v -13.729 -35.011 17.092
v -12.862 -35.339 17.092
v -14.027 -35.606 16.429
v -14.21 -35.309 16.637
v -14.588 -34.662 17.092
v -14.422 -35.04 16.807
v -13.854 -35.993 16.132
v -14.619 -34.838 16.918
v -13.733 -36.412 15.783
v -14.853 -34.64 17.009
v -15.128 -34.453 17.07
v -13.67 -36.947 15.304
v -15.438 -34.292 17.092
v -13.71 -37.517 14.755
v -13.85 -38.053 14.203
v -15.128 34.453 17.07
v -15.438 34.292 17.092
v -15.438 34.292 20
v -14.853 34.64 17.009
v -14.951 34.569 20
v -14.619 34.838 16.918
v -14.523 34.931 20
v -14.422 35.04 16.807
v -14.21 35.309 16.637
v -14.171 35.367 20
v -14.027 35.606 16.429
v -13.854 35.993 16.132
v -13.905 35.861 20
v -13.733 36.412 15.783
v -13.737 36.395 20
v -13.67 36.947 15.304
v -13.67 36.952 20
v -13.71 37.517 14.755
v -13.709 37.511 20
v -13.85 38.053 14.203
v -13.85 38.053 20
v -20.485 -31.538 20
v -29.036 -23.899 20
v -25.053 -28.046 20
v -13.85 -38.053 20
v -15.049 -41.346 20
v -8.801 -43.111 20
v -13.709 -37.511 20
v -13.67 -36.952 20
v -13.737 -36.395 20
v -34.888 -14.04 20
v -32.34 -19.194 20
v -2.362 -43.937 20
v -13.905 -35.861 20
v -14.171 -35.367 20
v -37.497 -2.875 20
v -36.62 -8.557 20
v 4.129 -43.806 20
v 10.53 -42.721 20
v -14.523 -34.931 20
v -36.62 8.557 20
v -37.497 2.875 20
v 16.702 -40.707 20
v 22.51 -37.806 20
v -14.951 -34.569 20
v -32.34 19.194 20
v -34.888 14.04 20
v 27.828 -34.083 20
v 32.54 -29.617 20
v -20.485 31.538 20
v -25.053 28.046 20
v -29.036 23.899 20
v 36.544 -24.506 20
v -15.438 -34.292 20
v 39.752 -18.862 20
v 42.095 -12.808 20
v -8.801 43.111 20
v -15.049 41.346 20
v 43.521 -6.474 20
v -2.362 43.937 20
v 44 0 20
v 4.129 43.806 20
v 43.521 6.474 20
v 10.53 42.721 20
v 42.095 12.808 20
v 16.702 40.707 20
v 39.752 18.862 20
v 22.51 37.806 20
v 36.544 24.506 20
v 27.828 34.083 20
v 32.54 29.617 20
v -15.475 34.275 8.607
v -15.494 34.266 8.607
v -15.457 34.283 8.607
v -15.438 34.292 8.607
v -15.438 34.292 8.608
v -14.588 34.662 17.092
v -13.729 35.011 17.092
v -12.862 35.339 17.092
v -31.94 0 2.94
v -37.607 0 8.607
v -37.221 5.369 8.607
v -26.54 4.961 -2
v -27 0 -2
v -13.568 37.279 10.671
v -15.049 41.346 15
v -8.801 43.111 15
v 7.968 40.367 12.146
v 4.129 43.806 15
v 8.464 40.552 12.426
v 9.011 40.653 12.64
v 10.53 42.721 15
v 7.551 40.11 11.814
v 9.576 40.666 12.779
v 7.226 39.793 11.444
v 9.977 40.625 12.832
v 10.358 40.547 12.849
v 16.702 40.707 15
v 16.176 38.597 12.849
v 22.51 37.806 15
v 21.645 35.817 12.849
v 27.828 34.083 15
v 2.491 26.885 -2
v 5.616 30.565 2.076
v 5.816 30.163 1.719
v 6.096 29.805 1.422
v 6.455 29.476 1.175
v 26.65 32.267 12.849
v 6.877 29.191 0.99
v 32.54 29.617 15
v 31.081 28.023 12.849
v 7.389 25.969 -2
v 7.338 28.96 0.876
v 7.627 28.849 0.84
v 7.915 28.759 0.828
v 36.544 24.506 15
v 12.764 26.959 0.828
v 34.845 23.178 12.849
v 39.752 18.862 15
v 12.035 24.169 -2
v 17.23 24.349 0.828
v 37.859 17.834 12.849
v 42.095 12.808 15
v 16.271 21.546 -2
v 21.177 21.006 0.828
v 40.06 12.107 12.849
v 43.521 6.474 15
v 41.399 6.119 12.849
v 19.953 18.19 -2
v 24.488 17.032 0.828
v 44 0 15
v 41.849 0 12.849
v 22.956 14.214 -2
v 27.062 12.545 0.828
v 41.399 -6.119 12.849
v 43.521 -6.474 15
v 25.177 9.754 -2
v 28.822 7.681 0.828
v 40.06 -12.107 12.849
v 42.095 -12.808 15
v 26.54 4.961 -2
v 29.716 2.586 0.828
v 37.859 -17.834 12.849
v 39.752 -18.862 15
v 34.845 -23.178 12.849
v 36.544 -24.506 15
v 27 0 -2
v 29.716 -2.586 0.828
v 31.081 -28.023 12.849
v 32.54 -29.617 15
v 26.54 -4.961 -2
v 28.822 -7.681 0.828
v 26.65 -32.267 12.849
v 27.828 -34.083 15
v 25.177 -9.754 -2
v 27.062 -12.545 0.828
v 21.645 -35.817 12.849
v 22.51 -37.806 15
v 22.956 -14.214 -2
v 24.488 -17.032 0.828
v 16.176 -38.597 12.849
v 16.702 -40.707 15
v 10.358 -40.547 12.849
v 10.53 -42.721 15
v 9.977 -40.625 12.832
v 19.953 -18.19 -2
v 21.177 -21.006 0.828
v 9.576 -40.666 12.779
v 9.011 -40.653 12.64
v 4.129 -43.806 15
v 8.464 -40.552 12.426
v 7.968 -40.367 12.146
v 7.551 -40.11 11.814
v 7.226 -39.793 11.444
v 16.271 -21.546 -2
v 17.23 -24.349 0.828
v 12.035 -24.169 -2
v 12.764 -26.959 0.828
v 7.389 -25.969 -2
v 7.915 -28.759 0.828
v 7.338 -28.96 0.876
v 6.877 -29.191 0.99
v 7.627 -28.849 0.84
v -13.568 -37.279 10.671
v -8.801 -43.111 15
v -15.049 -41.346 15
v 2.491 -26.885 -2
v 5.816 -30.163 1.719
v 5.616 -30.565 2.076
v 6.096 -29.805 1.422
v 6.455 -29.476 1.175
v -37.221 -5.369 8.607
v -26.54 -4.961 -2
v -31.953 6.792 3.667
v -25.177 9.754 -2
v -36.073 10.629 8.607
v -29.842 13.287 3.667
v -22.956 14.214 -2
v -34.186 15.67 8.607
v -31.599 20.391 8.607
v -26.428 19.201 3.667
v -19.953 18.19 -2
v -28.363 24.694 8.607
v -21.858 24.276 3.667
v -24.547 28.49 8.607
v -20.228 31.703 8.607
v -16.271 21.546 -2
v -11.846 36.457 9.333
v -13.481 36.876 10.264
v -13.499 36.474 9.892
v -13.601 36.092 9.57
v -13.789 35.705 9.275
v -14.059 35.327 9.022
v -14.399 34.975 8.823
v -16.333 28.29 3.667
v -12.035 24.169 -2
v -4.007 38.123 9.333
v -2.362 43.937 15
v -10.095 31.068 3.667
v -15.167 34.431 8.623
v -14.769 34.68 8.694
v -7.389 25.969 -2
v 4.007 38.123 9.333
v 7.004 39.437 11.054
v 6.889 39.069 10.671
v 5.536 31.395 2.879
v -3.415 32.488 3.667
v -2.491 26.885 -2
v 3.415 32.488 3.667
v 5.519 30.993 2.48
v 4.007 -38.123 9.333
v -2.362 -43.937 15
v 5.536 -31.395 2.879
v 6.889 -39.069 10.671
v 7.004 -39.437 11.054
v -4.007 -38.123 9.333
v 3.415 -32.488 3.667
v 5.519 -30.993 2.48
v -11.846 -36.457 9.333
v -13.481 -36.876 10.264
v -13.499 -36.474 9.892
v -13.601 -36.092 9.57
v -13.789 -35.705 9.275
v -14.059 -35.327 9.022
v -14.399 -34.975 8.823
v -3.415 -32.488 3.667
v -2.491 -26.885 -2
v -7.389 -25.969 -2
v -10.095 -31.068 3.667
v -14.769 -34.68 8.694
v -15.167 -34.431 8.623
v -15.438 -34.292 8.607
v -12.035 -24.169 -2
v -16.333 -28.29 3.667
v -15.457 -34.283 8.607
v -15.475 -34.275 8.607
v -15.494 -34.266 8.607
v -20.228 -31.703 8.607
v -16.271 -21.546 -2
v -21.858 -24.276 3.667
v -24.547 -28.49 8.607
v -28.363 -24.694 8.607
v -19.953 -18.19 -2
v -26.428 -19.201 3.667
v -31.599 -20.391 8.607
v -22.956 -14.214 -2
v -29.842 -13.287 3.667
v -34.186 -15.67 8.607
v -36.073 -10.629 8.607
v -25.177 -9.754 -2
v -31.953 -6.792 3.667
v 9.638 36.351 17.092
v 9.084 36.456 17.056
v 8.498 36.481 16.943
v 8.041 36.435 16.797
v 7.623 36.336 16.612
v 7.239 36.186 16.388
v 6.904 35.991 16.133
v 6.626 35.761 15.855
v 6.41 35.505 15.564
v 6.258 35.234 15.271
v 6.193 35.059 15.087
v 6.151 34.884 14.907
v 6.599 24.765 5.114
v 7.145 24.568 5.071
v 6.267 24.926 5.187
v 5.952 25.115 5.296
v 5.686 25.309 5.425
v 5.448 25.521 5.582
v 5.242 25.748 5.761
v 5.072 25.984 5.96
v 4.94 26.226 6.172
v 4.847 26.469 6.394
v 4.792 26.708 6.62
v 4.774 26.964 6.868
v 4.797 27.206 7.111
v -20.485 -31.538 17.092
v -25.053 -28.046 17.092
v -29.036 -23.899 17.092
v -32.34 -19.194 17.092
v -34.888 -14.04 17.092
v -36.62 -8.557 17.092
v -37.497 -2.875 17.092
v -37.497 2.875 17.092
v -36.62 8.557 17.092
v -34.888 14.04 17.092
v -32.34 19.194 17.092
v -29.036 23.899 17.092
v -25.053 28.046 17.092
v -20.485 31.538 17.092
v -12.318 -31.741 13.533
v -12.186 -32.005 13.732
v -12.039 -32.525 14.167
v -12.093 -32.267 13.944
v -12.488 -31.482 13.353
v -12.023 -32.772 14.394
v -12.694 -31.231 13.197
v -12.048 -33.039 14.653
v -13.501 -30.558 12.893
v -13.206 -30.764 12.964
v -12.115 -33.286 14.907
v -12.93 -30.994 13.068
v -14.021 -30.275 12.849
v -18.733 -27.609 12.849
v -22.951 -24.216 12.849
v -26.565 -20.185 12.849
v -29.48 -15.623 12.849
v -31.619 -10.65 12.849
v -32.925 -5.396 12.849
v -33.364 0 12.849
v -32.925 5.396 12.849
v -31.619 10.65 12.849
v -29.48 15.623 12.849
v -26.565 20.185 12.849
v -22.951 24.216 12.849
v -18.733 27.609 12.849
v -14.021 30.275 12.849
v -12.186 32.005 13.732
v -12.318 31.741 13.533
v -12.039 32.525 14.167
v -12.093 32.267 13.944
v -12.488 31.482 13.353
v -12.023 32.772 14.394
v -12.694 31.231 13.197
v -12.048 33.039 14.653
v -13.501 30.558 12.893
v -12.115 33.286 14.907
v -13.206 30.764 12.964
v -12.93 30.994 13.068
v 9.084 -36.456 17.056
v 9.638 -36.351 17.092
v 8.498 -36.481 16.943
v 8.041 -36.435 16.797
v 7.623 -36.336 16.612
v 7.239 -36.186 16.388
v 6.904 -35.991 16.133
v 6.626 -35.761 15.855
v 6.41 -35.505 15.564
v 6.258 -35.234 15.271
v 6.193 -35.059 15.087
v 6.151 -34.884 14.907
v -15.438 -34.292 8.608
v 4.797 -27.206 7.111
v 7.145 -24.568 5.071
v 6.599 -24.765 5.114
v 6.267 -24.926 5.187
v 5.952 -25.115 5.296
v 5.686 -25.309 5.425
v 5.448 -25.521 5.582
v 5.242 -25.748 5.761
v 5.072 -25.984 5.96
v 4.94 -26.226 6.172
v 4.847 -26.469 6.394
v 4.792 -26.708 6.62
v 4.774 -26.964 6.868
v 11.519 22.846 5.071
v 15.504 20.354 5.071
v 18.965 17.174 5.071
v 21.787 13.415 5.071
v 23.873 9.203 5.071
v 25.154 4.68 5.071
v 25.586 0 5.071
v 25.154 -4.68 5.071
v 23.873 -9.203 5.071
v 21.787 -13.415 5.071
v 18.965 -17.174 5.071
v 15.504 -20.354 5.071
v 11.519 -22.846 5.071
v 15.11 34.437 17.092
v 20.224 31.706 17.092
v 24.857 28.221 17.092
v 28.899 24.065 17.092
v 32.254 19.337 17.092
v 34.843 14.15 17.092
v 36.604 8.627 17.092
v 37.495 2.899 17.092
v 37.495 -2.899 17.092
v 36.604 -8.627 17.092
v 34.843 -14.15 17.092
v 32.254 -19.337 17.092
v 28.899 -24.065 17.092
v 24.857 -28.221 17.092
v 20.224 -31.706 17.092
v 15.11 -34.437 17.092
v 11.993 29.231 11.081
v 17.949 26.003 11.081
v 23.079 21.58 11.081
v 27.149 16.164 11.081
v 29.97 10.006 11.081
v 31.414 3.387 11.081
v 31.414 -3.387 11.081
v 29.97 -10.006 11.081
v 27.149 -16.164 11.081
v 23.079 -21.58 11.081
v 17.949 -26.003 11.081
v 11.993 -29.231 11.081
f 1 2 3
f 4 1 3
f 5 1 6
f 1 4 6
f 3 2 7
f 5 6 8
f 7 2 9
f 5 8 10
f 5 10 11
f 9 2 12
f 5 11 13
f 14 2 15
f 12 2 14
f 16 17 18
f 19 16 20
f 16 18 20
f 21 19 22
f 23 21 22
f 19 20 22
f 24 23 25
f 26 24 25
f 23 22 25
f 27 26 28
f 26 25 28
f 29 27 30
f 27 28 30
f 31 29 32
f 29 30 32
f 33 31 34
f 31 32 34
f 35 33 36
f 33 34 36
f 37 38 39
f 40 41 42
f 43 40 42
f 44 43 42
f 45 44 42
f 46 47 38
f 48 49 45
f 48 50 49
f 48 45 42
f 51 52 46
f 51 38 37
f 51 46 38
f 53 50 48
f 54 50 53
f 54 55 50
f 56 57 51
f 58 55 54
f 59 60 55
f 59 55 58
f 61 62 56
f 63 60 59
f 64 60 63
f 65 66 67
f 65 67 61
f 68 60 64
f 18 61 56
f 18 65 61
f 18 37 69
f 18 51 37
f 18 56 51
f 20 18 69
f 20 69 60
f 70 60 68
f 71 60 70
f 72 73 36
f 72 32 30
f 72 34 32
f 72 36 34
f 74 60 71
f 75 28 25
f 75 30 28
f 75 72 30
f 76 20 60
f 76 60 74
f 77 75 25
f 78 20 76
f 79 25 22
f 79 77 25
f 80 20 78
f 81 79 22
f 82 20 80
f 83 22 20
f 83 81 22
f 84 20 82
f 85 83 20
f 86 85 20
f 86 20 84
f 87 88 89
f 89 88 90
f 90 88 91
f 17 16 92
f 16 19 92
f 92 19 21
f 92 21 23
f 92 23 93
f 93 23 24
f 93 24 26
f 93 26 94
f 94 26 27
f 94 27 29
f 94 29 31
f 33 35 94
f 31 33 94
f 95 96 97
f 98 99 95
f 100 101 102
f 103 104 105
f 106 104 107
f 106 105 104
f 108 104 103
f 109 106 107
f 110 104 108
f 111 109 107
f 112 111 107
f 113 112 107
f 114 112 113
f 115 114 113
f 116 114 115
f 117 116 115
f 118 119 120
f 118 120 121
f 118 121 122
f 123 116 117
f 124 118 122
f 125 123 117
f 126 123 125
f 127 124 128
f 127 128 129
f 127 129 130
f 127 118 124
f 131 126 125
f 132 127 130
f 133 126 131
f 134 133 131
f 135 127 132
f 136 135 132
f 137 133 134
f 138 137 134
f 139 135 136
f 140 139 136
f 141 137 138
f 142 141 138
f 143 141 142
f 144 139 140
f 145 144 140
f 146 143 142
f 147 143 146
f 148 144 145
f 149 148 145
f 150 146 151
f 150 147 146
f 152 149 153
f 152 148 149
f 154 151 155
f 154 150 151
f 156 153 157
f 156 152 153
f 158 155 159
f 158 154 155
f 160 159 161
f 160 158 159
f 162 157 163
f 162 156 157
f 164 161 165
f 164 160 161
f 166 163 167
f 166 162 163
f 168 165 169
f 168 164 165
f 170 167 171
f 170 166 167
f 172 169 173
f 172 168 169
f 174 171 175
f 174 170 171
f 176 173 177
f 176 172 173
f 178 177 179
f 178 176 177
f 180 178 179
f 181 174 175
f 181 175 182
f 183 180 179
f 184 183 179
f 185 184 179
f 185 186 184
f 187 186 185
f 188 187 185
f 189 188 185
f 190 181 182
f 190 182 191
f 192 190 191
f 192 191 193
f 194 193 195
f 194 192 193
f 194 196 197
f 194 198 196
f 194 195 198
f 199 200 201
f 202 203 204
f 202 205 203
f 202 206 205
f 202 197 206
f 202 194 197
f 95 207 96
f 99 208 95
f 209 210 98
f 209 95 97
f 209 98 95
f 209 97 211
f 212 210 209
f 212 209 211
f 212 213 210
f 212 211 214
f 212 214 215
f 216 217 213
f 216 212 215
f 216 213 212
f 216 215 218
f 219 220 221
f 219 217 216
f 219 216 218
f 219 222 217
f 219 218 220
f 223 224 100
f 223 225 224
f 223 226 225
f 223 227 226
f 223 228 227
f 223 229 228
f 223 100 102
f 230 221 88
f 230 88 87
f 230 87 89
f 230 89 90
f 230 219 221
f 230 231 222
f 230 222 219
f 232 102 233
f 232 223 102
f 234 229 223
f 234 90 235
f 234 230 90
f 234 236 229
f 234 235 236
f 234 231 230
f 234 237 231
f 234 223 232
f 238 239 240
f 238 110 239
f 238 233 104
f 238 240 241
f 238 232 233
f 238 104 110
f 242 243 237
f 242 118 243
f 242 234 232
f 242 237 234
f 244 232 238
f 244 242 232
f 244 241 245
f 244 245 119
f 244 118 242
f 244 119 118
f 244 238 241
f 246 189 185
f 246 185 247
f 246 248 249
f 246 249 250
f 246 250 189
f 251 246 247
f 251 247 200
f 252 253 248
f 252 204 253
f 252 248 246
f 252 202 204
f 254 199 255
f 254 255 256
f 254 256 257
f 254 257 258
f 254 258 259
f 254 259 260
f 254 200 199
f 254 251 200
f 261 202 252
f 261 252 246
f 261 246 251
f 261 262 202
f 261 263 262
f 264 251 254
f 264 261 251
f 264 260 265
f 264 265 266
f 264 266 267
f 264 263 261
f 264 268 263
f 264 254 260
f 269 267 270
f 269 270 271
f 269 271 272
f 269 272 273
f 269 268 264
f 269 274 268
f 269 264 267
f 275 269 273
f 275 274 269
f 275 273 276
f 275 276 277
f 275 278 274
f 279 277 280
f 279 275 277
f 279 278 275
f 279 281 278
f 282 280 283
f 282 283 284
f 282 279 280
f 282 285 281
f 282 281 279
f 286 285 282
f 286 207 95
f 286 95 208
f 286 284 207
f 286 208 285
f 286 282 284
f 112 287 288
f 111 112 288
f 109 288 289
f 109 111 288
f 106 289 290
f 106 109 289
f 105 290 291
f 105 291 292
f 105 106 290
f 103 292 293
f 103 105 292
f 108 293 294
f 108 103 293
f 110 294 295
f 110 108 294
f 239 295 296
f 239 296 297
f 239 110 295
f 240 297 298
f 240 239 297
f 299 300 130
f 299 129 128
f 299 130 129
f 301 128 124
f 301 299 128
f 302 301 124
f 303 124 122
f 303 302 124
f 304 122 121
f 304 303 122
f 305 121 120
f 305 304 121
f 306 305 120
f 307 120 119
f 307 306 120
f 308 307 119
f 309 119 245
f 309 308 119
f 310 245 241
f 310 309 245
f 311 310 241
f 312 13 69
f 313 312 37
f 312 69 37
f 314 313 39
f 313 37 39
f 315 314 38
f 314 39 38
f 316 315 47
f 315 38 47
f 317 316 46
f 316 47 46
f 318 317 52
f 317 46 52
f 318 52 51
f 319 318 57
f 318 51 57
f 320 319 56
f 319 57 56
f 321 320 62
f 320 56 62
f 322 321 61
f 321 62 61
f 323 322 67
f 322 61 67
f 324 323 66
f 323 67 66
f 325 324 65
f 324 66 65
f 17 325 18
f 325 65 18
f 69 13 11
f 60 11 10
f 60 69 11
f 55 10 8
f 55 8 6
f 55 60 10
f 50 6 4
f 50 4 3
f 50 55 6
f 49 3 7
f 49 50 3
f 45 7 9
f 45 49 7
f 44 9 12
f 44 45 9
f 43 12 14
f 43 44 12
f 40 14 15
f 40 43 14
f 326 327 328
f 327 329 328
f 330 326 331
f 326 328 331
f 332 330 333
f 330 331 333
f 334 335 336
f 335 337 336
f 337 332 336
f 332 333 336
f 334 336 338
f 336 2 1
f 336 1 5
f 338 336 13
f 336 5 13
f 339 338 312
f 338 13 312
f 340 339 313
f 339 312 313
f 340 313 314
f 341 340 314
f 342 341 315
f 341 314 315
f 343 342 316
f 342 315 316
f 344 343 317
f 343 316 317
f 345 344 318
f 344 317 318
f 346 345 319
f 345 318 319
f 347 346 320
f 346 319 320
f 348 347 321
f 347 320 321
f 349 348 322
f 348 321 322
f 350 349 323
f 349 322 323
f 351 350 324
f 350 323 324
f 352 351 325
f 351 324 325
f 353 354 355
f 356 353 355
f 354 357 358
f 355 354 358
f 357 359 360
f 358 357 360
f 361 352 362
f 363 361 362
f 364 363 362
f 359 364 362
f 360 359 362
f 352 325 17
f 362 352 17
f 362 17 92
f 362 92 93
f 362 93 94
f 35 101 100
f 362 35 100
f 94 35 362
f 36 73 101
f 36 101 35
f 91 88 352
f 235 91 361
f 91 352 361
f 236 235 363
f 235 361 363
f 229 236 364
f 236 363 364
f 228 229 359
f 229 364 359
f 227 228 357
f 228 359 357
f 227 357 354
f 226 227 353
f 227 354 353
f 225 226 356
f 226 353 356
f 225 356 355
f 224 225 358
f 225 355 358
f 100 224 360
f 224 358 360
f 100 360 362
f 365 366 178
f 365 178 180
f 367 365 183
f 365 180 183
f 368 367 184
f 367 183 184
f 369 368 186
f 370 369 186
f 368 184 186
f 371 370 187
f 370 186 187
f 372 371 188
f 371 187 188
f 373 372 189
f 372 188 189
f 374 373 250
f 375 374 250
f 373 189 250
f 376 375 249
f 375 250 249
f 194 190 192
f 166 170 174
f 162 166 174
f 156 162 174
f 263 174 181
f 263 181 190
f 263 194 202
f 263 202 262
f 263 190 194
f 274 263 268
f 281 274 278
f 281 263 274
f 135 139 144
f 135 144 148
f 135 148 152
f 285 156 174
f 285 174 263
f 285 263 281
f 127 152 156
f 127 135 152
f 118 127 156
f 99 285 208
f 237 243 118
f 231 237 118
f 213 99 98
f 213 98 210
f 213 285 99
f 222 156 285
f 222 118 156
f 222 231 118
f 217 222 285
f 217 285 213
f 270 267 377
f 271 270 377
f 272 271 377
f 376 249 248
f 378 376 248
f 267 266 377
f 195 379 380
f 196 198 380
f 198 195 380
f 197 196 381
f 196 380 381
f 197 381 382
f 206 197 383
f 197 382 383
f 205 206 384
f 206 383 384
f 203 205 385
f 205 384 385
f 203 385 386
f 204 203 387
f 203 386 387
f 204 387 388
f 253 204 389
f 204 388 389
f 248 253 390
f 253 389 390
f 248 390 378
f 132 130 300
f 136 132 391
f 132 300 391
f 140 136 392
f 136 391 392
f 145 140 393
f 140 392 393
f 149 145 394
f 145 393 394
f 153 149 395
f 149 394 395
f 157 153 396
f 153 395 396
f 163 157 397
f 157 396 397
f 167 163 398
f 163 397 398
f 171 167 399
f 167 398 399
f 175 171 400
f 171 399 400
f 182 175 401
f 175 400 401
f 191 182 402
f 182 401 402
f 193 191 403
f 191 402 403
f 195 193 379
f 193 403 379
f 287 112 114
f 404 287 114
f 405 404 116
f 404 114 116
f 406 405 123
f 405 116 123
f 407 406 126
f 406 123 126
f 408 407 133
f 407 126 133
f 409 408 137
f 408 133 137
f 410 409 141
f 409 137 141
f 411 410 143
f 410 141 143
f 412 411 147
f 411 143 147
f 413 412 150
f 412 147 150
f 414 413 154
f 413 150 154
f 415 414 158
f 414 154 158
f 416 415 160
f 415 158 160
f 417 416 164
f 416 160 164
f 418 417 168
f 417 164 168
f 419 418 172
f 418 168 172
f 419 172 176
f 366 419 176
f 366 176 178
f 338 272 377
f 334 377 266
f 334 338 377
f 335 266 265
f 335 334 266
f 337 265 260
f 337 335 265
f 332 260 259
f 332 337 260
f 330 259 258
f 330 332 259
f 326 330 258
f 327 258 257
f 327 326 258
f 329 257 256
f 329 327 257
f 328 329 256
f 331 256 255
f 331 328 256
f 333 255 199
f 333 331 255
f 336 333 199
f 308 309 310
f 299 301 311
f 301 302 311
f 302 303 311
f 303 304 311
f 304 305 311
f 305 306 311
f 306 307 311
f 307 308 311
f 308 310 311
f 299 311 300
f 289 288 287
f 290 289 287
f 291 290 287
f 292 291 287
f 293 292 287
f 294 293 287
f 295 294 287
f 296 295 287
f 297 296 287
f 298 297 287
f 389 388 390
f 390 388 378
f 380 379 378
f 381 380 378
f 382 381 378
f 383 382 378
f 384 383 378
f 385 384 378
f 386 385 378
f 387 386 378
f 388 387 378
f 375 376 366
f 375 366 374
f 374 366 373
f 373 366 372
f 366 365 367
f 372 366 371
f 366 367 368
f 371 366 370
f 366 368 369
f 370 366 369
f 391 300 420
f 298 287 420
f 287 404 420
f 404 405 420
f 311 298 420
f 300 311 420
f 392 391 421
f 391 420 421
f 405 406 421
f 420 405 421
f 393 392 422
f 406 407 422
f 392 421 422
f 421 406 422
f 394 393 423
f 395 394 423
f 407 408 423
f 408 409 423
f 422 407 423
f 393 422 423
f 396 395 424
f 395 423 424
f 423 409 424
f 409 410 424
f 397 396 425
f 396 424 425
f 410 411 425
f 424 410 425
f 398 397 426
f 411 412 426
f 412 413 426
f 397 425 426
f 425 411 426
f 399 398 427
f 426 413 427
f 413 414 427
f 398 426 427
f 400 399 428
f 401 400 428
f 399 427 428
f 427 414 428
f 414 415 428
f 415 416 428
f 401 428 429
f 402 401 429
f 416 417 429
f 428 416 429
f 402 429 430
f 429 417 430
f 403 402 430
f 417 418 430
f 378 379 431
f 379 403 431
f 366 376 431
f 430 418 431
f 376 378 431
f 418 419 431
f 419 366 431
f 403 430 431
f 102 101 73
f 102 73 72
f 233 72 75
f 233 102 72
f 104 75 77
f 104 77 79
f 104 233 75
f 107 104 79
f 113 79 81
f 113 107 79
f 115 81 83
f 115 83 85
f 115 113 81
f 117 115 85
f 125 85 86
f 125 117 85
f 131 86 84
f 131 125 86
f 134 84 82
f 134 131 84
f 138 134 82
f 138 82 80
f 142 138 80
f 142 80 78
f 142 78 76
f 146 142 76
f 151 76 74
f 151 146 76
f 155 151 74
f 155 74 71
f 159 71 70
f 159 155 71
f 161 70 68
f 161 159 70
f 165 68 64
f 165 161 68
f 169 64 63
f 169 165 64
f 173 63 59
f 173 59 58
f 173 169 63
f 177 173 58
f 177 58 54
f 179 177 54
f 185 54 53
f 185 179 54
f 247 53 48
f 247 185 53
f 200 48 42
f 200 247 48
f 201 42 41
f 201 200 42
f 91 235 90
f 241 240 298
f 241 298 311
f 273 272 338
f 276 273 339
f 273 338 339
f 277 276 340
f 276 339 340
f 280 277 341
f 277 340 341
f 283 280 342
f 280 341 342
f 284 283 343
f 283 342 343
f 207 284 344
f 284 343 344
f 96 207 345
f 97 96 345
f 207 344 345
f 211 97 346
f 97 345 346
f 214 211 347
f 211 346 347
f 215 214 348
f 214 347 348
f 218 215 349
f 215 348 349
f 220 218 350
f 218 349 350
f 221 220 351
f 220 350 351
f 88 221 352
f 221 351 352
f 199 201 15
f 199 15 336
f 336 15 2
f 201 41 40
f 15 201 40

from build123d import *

# Parameters (mm, degrees)
F3_W           = 8.3933982822
F3_H           = 16.3933982822
F4_ANGLE_BACK  = 70
F4_ANGLE       = 140
F6_ANGLE_START = 100
F6_ANGLE       = 160
F7_ANGLE_BACK  = 70
F7_ANGLE       = 140
F8_R           = 3
F8_2_R         = 3
F9_R           = 3


with BuildPart() as f1:
    # F0 (on Front) → F1 (revolve)
    with BuildSketch(Plane.XZ):
        Polygon((-44, 15), (-27, -2), (0, -2), (0, 20), (-44, 20), align=None)
    revolve(axis=Axis((0, 0, 9.4880101401), (0, 0, -1)))


with BuildPart() as f4:
    # F3 (on Front) → F4 (revolve)
    with BuildSketch(Plane.XZ, mode=Mode.PRIVATE) as f4_sk:
        with Locations((-41.8033008589, 16.8033008589)):
            Rectangle(F3_W, F3_H)
    revolve(f4_sk.sketch.rotate(Axis((0, 0, 9.4880101401), (0, 0, -1)), -F4_ANGLE_BACK), axis=Axis((0, 0, 9.4880101401), (0, 0, -1)), revolution_arc=F4_ANGLE)

    # F8#2
    f8_2_edges = [f4.edges().sort_by_distance(p)[0] for p in [
        (-12.862215, 35.338646, 16.803301),
        (-12.862215, -35.338646, 16.803301),
    ]]
    fillet(f8_2_edges, radius=F8_2_R)


with BuildPart() as f6:
    # F5 (on Front) → F6 (revolve)
    with BuildSketch(Plane.XZ, mode=Mode.PRIVATE) as f6_sk:
        Polygon((-36.8994949366, -6.2426406871), (-25.5857864376, 5.0710678119), (-37.6066017178, 17.091883092), (-48.9203102168, 5.7781745931), align=None)
    revolve(f6_sk.sketch.rotate(Axis((0, 0, 9), (0, 0, -1)), F6_ANGLE_START), axis=Axis((0, 0, 9), (0, 0, -1)), revolution_arc=F6_ANGLE)

    # F9
    f9_edges = [f6.edges().sort_by_distance(p)[0] for p in [
        (5.425228, 30.767995, -0.585786),
        (7.51262, 42.606187, 11.435029),
        (7.51262, -42.606187, 11.435029),
        (5.425228, -30.767995, -0.585786),
    ]]
    fillet(f9_edges, radius=F9_R)


with BuildPart() as f7:
    # F2 (on Front) → F7 (revolve)
    with BuildSketch(Plane.XZ, mode=Mode.PRIVATE) as f7_sk:
        Polygon((-42.7019295049, 3.5112739307), (-33.3639610307, 12.8492424049), (-37.6066017178, 17.091883092), (-46.944570192, 7.7539146178), align=None)
    revolve(f7_sk.sketch.rotate(Axis((0, 0, 9), (0, 0, -1)), -F7_ANGLE_BACK), axis=Axis((0, 0, 9), (0, 0, -1)), revolution_arc=F7_ANGLE)

    # F8
    f8_edges = [f7.edges().sort_by_distance(p)[0] for p in [
        (-13.008033, -35.739278, 8.180258),
        (-13.008033, 35.739278, 8.180258),
    ]]
    fillet(f8_edges, radius=F8_R)


with BuildPart() as f1_1:
    add(f1.part)

    # F10: cut F7, F4, F6
    add(f7.part, mode=Mode.SUBTRACT)
    add(f4.part, mode=Mode.SUBTRACT)
    add(f6.part, mode=Mode.SUBTRACT)


solid = f1_1.part
